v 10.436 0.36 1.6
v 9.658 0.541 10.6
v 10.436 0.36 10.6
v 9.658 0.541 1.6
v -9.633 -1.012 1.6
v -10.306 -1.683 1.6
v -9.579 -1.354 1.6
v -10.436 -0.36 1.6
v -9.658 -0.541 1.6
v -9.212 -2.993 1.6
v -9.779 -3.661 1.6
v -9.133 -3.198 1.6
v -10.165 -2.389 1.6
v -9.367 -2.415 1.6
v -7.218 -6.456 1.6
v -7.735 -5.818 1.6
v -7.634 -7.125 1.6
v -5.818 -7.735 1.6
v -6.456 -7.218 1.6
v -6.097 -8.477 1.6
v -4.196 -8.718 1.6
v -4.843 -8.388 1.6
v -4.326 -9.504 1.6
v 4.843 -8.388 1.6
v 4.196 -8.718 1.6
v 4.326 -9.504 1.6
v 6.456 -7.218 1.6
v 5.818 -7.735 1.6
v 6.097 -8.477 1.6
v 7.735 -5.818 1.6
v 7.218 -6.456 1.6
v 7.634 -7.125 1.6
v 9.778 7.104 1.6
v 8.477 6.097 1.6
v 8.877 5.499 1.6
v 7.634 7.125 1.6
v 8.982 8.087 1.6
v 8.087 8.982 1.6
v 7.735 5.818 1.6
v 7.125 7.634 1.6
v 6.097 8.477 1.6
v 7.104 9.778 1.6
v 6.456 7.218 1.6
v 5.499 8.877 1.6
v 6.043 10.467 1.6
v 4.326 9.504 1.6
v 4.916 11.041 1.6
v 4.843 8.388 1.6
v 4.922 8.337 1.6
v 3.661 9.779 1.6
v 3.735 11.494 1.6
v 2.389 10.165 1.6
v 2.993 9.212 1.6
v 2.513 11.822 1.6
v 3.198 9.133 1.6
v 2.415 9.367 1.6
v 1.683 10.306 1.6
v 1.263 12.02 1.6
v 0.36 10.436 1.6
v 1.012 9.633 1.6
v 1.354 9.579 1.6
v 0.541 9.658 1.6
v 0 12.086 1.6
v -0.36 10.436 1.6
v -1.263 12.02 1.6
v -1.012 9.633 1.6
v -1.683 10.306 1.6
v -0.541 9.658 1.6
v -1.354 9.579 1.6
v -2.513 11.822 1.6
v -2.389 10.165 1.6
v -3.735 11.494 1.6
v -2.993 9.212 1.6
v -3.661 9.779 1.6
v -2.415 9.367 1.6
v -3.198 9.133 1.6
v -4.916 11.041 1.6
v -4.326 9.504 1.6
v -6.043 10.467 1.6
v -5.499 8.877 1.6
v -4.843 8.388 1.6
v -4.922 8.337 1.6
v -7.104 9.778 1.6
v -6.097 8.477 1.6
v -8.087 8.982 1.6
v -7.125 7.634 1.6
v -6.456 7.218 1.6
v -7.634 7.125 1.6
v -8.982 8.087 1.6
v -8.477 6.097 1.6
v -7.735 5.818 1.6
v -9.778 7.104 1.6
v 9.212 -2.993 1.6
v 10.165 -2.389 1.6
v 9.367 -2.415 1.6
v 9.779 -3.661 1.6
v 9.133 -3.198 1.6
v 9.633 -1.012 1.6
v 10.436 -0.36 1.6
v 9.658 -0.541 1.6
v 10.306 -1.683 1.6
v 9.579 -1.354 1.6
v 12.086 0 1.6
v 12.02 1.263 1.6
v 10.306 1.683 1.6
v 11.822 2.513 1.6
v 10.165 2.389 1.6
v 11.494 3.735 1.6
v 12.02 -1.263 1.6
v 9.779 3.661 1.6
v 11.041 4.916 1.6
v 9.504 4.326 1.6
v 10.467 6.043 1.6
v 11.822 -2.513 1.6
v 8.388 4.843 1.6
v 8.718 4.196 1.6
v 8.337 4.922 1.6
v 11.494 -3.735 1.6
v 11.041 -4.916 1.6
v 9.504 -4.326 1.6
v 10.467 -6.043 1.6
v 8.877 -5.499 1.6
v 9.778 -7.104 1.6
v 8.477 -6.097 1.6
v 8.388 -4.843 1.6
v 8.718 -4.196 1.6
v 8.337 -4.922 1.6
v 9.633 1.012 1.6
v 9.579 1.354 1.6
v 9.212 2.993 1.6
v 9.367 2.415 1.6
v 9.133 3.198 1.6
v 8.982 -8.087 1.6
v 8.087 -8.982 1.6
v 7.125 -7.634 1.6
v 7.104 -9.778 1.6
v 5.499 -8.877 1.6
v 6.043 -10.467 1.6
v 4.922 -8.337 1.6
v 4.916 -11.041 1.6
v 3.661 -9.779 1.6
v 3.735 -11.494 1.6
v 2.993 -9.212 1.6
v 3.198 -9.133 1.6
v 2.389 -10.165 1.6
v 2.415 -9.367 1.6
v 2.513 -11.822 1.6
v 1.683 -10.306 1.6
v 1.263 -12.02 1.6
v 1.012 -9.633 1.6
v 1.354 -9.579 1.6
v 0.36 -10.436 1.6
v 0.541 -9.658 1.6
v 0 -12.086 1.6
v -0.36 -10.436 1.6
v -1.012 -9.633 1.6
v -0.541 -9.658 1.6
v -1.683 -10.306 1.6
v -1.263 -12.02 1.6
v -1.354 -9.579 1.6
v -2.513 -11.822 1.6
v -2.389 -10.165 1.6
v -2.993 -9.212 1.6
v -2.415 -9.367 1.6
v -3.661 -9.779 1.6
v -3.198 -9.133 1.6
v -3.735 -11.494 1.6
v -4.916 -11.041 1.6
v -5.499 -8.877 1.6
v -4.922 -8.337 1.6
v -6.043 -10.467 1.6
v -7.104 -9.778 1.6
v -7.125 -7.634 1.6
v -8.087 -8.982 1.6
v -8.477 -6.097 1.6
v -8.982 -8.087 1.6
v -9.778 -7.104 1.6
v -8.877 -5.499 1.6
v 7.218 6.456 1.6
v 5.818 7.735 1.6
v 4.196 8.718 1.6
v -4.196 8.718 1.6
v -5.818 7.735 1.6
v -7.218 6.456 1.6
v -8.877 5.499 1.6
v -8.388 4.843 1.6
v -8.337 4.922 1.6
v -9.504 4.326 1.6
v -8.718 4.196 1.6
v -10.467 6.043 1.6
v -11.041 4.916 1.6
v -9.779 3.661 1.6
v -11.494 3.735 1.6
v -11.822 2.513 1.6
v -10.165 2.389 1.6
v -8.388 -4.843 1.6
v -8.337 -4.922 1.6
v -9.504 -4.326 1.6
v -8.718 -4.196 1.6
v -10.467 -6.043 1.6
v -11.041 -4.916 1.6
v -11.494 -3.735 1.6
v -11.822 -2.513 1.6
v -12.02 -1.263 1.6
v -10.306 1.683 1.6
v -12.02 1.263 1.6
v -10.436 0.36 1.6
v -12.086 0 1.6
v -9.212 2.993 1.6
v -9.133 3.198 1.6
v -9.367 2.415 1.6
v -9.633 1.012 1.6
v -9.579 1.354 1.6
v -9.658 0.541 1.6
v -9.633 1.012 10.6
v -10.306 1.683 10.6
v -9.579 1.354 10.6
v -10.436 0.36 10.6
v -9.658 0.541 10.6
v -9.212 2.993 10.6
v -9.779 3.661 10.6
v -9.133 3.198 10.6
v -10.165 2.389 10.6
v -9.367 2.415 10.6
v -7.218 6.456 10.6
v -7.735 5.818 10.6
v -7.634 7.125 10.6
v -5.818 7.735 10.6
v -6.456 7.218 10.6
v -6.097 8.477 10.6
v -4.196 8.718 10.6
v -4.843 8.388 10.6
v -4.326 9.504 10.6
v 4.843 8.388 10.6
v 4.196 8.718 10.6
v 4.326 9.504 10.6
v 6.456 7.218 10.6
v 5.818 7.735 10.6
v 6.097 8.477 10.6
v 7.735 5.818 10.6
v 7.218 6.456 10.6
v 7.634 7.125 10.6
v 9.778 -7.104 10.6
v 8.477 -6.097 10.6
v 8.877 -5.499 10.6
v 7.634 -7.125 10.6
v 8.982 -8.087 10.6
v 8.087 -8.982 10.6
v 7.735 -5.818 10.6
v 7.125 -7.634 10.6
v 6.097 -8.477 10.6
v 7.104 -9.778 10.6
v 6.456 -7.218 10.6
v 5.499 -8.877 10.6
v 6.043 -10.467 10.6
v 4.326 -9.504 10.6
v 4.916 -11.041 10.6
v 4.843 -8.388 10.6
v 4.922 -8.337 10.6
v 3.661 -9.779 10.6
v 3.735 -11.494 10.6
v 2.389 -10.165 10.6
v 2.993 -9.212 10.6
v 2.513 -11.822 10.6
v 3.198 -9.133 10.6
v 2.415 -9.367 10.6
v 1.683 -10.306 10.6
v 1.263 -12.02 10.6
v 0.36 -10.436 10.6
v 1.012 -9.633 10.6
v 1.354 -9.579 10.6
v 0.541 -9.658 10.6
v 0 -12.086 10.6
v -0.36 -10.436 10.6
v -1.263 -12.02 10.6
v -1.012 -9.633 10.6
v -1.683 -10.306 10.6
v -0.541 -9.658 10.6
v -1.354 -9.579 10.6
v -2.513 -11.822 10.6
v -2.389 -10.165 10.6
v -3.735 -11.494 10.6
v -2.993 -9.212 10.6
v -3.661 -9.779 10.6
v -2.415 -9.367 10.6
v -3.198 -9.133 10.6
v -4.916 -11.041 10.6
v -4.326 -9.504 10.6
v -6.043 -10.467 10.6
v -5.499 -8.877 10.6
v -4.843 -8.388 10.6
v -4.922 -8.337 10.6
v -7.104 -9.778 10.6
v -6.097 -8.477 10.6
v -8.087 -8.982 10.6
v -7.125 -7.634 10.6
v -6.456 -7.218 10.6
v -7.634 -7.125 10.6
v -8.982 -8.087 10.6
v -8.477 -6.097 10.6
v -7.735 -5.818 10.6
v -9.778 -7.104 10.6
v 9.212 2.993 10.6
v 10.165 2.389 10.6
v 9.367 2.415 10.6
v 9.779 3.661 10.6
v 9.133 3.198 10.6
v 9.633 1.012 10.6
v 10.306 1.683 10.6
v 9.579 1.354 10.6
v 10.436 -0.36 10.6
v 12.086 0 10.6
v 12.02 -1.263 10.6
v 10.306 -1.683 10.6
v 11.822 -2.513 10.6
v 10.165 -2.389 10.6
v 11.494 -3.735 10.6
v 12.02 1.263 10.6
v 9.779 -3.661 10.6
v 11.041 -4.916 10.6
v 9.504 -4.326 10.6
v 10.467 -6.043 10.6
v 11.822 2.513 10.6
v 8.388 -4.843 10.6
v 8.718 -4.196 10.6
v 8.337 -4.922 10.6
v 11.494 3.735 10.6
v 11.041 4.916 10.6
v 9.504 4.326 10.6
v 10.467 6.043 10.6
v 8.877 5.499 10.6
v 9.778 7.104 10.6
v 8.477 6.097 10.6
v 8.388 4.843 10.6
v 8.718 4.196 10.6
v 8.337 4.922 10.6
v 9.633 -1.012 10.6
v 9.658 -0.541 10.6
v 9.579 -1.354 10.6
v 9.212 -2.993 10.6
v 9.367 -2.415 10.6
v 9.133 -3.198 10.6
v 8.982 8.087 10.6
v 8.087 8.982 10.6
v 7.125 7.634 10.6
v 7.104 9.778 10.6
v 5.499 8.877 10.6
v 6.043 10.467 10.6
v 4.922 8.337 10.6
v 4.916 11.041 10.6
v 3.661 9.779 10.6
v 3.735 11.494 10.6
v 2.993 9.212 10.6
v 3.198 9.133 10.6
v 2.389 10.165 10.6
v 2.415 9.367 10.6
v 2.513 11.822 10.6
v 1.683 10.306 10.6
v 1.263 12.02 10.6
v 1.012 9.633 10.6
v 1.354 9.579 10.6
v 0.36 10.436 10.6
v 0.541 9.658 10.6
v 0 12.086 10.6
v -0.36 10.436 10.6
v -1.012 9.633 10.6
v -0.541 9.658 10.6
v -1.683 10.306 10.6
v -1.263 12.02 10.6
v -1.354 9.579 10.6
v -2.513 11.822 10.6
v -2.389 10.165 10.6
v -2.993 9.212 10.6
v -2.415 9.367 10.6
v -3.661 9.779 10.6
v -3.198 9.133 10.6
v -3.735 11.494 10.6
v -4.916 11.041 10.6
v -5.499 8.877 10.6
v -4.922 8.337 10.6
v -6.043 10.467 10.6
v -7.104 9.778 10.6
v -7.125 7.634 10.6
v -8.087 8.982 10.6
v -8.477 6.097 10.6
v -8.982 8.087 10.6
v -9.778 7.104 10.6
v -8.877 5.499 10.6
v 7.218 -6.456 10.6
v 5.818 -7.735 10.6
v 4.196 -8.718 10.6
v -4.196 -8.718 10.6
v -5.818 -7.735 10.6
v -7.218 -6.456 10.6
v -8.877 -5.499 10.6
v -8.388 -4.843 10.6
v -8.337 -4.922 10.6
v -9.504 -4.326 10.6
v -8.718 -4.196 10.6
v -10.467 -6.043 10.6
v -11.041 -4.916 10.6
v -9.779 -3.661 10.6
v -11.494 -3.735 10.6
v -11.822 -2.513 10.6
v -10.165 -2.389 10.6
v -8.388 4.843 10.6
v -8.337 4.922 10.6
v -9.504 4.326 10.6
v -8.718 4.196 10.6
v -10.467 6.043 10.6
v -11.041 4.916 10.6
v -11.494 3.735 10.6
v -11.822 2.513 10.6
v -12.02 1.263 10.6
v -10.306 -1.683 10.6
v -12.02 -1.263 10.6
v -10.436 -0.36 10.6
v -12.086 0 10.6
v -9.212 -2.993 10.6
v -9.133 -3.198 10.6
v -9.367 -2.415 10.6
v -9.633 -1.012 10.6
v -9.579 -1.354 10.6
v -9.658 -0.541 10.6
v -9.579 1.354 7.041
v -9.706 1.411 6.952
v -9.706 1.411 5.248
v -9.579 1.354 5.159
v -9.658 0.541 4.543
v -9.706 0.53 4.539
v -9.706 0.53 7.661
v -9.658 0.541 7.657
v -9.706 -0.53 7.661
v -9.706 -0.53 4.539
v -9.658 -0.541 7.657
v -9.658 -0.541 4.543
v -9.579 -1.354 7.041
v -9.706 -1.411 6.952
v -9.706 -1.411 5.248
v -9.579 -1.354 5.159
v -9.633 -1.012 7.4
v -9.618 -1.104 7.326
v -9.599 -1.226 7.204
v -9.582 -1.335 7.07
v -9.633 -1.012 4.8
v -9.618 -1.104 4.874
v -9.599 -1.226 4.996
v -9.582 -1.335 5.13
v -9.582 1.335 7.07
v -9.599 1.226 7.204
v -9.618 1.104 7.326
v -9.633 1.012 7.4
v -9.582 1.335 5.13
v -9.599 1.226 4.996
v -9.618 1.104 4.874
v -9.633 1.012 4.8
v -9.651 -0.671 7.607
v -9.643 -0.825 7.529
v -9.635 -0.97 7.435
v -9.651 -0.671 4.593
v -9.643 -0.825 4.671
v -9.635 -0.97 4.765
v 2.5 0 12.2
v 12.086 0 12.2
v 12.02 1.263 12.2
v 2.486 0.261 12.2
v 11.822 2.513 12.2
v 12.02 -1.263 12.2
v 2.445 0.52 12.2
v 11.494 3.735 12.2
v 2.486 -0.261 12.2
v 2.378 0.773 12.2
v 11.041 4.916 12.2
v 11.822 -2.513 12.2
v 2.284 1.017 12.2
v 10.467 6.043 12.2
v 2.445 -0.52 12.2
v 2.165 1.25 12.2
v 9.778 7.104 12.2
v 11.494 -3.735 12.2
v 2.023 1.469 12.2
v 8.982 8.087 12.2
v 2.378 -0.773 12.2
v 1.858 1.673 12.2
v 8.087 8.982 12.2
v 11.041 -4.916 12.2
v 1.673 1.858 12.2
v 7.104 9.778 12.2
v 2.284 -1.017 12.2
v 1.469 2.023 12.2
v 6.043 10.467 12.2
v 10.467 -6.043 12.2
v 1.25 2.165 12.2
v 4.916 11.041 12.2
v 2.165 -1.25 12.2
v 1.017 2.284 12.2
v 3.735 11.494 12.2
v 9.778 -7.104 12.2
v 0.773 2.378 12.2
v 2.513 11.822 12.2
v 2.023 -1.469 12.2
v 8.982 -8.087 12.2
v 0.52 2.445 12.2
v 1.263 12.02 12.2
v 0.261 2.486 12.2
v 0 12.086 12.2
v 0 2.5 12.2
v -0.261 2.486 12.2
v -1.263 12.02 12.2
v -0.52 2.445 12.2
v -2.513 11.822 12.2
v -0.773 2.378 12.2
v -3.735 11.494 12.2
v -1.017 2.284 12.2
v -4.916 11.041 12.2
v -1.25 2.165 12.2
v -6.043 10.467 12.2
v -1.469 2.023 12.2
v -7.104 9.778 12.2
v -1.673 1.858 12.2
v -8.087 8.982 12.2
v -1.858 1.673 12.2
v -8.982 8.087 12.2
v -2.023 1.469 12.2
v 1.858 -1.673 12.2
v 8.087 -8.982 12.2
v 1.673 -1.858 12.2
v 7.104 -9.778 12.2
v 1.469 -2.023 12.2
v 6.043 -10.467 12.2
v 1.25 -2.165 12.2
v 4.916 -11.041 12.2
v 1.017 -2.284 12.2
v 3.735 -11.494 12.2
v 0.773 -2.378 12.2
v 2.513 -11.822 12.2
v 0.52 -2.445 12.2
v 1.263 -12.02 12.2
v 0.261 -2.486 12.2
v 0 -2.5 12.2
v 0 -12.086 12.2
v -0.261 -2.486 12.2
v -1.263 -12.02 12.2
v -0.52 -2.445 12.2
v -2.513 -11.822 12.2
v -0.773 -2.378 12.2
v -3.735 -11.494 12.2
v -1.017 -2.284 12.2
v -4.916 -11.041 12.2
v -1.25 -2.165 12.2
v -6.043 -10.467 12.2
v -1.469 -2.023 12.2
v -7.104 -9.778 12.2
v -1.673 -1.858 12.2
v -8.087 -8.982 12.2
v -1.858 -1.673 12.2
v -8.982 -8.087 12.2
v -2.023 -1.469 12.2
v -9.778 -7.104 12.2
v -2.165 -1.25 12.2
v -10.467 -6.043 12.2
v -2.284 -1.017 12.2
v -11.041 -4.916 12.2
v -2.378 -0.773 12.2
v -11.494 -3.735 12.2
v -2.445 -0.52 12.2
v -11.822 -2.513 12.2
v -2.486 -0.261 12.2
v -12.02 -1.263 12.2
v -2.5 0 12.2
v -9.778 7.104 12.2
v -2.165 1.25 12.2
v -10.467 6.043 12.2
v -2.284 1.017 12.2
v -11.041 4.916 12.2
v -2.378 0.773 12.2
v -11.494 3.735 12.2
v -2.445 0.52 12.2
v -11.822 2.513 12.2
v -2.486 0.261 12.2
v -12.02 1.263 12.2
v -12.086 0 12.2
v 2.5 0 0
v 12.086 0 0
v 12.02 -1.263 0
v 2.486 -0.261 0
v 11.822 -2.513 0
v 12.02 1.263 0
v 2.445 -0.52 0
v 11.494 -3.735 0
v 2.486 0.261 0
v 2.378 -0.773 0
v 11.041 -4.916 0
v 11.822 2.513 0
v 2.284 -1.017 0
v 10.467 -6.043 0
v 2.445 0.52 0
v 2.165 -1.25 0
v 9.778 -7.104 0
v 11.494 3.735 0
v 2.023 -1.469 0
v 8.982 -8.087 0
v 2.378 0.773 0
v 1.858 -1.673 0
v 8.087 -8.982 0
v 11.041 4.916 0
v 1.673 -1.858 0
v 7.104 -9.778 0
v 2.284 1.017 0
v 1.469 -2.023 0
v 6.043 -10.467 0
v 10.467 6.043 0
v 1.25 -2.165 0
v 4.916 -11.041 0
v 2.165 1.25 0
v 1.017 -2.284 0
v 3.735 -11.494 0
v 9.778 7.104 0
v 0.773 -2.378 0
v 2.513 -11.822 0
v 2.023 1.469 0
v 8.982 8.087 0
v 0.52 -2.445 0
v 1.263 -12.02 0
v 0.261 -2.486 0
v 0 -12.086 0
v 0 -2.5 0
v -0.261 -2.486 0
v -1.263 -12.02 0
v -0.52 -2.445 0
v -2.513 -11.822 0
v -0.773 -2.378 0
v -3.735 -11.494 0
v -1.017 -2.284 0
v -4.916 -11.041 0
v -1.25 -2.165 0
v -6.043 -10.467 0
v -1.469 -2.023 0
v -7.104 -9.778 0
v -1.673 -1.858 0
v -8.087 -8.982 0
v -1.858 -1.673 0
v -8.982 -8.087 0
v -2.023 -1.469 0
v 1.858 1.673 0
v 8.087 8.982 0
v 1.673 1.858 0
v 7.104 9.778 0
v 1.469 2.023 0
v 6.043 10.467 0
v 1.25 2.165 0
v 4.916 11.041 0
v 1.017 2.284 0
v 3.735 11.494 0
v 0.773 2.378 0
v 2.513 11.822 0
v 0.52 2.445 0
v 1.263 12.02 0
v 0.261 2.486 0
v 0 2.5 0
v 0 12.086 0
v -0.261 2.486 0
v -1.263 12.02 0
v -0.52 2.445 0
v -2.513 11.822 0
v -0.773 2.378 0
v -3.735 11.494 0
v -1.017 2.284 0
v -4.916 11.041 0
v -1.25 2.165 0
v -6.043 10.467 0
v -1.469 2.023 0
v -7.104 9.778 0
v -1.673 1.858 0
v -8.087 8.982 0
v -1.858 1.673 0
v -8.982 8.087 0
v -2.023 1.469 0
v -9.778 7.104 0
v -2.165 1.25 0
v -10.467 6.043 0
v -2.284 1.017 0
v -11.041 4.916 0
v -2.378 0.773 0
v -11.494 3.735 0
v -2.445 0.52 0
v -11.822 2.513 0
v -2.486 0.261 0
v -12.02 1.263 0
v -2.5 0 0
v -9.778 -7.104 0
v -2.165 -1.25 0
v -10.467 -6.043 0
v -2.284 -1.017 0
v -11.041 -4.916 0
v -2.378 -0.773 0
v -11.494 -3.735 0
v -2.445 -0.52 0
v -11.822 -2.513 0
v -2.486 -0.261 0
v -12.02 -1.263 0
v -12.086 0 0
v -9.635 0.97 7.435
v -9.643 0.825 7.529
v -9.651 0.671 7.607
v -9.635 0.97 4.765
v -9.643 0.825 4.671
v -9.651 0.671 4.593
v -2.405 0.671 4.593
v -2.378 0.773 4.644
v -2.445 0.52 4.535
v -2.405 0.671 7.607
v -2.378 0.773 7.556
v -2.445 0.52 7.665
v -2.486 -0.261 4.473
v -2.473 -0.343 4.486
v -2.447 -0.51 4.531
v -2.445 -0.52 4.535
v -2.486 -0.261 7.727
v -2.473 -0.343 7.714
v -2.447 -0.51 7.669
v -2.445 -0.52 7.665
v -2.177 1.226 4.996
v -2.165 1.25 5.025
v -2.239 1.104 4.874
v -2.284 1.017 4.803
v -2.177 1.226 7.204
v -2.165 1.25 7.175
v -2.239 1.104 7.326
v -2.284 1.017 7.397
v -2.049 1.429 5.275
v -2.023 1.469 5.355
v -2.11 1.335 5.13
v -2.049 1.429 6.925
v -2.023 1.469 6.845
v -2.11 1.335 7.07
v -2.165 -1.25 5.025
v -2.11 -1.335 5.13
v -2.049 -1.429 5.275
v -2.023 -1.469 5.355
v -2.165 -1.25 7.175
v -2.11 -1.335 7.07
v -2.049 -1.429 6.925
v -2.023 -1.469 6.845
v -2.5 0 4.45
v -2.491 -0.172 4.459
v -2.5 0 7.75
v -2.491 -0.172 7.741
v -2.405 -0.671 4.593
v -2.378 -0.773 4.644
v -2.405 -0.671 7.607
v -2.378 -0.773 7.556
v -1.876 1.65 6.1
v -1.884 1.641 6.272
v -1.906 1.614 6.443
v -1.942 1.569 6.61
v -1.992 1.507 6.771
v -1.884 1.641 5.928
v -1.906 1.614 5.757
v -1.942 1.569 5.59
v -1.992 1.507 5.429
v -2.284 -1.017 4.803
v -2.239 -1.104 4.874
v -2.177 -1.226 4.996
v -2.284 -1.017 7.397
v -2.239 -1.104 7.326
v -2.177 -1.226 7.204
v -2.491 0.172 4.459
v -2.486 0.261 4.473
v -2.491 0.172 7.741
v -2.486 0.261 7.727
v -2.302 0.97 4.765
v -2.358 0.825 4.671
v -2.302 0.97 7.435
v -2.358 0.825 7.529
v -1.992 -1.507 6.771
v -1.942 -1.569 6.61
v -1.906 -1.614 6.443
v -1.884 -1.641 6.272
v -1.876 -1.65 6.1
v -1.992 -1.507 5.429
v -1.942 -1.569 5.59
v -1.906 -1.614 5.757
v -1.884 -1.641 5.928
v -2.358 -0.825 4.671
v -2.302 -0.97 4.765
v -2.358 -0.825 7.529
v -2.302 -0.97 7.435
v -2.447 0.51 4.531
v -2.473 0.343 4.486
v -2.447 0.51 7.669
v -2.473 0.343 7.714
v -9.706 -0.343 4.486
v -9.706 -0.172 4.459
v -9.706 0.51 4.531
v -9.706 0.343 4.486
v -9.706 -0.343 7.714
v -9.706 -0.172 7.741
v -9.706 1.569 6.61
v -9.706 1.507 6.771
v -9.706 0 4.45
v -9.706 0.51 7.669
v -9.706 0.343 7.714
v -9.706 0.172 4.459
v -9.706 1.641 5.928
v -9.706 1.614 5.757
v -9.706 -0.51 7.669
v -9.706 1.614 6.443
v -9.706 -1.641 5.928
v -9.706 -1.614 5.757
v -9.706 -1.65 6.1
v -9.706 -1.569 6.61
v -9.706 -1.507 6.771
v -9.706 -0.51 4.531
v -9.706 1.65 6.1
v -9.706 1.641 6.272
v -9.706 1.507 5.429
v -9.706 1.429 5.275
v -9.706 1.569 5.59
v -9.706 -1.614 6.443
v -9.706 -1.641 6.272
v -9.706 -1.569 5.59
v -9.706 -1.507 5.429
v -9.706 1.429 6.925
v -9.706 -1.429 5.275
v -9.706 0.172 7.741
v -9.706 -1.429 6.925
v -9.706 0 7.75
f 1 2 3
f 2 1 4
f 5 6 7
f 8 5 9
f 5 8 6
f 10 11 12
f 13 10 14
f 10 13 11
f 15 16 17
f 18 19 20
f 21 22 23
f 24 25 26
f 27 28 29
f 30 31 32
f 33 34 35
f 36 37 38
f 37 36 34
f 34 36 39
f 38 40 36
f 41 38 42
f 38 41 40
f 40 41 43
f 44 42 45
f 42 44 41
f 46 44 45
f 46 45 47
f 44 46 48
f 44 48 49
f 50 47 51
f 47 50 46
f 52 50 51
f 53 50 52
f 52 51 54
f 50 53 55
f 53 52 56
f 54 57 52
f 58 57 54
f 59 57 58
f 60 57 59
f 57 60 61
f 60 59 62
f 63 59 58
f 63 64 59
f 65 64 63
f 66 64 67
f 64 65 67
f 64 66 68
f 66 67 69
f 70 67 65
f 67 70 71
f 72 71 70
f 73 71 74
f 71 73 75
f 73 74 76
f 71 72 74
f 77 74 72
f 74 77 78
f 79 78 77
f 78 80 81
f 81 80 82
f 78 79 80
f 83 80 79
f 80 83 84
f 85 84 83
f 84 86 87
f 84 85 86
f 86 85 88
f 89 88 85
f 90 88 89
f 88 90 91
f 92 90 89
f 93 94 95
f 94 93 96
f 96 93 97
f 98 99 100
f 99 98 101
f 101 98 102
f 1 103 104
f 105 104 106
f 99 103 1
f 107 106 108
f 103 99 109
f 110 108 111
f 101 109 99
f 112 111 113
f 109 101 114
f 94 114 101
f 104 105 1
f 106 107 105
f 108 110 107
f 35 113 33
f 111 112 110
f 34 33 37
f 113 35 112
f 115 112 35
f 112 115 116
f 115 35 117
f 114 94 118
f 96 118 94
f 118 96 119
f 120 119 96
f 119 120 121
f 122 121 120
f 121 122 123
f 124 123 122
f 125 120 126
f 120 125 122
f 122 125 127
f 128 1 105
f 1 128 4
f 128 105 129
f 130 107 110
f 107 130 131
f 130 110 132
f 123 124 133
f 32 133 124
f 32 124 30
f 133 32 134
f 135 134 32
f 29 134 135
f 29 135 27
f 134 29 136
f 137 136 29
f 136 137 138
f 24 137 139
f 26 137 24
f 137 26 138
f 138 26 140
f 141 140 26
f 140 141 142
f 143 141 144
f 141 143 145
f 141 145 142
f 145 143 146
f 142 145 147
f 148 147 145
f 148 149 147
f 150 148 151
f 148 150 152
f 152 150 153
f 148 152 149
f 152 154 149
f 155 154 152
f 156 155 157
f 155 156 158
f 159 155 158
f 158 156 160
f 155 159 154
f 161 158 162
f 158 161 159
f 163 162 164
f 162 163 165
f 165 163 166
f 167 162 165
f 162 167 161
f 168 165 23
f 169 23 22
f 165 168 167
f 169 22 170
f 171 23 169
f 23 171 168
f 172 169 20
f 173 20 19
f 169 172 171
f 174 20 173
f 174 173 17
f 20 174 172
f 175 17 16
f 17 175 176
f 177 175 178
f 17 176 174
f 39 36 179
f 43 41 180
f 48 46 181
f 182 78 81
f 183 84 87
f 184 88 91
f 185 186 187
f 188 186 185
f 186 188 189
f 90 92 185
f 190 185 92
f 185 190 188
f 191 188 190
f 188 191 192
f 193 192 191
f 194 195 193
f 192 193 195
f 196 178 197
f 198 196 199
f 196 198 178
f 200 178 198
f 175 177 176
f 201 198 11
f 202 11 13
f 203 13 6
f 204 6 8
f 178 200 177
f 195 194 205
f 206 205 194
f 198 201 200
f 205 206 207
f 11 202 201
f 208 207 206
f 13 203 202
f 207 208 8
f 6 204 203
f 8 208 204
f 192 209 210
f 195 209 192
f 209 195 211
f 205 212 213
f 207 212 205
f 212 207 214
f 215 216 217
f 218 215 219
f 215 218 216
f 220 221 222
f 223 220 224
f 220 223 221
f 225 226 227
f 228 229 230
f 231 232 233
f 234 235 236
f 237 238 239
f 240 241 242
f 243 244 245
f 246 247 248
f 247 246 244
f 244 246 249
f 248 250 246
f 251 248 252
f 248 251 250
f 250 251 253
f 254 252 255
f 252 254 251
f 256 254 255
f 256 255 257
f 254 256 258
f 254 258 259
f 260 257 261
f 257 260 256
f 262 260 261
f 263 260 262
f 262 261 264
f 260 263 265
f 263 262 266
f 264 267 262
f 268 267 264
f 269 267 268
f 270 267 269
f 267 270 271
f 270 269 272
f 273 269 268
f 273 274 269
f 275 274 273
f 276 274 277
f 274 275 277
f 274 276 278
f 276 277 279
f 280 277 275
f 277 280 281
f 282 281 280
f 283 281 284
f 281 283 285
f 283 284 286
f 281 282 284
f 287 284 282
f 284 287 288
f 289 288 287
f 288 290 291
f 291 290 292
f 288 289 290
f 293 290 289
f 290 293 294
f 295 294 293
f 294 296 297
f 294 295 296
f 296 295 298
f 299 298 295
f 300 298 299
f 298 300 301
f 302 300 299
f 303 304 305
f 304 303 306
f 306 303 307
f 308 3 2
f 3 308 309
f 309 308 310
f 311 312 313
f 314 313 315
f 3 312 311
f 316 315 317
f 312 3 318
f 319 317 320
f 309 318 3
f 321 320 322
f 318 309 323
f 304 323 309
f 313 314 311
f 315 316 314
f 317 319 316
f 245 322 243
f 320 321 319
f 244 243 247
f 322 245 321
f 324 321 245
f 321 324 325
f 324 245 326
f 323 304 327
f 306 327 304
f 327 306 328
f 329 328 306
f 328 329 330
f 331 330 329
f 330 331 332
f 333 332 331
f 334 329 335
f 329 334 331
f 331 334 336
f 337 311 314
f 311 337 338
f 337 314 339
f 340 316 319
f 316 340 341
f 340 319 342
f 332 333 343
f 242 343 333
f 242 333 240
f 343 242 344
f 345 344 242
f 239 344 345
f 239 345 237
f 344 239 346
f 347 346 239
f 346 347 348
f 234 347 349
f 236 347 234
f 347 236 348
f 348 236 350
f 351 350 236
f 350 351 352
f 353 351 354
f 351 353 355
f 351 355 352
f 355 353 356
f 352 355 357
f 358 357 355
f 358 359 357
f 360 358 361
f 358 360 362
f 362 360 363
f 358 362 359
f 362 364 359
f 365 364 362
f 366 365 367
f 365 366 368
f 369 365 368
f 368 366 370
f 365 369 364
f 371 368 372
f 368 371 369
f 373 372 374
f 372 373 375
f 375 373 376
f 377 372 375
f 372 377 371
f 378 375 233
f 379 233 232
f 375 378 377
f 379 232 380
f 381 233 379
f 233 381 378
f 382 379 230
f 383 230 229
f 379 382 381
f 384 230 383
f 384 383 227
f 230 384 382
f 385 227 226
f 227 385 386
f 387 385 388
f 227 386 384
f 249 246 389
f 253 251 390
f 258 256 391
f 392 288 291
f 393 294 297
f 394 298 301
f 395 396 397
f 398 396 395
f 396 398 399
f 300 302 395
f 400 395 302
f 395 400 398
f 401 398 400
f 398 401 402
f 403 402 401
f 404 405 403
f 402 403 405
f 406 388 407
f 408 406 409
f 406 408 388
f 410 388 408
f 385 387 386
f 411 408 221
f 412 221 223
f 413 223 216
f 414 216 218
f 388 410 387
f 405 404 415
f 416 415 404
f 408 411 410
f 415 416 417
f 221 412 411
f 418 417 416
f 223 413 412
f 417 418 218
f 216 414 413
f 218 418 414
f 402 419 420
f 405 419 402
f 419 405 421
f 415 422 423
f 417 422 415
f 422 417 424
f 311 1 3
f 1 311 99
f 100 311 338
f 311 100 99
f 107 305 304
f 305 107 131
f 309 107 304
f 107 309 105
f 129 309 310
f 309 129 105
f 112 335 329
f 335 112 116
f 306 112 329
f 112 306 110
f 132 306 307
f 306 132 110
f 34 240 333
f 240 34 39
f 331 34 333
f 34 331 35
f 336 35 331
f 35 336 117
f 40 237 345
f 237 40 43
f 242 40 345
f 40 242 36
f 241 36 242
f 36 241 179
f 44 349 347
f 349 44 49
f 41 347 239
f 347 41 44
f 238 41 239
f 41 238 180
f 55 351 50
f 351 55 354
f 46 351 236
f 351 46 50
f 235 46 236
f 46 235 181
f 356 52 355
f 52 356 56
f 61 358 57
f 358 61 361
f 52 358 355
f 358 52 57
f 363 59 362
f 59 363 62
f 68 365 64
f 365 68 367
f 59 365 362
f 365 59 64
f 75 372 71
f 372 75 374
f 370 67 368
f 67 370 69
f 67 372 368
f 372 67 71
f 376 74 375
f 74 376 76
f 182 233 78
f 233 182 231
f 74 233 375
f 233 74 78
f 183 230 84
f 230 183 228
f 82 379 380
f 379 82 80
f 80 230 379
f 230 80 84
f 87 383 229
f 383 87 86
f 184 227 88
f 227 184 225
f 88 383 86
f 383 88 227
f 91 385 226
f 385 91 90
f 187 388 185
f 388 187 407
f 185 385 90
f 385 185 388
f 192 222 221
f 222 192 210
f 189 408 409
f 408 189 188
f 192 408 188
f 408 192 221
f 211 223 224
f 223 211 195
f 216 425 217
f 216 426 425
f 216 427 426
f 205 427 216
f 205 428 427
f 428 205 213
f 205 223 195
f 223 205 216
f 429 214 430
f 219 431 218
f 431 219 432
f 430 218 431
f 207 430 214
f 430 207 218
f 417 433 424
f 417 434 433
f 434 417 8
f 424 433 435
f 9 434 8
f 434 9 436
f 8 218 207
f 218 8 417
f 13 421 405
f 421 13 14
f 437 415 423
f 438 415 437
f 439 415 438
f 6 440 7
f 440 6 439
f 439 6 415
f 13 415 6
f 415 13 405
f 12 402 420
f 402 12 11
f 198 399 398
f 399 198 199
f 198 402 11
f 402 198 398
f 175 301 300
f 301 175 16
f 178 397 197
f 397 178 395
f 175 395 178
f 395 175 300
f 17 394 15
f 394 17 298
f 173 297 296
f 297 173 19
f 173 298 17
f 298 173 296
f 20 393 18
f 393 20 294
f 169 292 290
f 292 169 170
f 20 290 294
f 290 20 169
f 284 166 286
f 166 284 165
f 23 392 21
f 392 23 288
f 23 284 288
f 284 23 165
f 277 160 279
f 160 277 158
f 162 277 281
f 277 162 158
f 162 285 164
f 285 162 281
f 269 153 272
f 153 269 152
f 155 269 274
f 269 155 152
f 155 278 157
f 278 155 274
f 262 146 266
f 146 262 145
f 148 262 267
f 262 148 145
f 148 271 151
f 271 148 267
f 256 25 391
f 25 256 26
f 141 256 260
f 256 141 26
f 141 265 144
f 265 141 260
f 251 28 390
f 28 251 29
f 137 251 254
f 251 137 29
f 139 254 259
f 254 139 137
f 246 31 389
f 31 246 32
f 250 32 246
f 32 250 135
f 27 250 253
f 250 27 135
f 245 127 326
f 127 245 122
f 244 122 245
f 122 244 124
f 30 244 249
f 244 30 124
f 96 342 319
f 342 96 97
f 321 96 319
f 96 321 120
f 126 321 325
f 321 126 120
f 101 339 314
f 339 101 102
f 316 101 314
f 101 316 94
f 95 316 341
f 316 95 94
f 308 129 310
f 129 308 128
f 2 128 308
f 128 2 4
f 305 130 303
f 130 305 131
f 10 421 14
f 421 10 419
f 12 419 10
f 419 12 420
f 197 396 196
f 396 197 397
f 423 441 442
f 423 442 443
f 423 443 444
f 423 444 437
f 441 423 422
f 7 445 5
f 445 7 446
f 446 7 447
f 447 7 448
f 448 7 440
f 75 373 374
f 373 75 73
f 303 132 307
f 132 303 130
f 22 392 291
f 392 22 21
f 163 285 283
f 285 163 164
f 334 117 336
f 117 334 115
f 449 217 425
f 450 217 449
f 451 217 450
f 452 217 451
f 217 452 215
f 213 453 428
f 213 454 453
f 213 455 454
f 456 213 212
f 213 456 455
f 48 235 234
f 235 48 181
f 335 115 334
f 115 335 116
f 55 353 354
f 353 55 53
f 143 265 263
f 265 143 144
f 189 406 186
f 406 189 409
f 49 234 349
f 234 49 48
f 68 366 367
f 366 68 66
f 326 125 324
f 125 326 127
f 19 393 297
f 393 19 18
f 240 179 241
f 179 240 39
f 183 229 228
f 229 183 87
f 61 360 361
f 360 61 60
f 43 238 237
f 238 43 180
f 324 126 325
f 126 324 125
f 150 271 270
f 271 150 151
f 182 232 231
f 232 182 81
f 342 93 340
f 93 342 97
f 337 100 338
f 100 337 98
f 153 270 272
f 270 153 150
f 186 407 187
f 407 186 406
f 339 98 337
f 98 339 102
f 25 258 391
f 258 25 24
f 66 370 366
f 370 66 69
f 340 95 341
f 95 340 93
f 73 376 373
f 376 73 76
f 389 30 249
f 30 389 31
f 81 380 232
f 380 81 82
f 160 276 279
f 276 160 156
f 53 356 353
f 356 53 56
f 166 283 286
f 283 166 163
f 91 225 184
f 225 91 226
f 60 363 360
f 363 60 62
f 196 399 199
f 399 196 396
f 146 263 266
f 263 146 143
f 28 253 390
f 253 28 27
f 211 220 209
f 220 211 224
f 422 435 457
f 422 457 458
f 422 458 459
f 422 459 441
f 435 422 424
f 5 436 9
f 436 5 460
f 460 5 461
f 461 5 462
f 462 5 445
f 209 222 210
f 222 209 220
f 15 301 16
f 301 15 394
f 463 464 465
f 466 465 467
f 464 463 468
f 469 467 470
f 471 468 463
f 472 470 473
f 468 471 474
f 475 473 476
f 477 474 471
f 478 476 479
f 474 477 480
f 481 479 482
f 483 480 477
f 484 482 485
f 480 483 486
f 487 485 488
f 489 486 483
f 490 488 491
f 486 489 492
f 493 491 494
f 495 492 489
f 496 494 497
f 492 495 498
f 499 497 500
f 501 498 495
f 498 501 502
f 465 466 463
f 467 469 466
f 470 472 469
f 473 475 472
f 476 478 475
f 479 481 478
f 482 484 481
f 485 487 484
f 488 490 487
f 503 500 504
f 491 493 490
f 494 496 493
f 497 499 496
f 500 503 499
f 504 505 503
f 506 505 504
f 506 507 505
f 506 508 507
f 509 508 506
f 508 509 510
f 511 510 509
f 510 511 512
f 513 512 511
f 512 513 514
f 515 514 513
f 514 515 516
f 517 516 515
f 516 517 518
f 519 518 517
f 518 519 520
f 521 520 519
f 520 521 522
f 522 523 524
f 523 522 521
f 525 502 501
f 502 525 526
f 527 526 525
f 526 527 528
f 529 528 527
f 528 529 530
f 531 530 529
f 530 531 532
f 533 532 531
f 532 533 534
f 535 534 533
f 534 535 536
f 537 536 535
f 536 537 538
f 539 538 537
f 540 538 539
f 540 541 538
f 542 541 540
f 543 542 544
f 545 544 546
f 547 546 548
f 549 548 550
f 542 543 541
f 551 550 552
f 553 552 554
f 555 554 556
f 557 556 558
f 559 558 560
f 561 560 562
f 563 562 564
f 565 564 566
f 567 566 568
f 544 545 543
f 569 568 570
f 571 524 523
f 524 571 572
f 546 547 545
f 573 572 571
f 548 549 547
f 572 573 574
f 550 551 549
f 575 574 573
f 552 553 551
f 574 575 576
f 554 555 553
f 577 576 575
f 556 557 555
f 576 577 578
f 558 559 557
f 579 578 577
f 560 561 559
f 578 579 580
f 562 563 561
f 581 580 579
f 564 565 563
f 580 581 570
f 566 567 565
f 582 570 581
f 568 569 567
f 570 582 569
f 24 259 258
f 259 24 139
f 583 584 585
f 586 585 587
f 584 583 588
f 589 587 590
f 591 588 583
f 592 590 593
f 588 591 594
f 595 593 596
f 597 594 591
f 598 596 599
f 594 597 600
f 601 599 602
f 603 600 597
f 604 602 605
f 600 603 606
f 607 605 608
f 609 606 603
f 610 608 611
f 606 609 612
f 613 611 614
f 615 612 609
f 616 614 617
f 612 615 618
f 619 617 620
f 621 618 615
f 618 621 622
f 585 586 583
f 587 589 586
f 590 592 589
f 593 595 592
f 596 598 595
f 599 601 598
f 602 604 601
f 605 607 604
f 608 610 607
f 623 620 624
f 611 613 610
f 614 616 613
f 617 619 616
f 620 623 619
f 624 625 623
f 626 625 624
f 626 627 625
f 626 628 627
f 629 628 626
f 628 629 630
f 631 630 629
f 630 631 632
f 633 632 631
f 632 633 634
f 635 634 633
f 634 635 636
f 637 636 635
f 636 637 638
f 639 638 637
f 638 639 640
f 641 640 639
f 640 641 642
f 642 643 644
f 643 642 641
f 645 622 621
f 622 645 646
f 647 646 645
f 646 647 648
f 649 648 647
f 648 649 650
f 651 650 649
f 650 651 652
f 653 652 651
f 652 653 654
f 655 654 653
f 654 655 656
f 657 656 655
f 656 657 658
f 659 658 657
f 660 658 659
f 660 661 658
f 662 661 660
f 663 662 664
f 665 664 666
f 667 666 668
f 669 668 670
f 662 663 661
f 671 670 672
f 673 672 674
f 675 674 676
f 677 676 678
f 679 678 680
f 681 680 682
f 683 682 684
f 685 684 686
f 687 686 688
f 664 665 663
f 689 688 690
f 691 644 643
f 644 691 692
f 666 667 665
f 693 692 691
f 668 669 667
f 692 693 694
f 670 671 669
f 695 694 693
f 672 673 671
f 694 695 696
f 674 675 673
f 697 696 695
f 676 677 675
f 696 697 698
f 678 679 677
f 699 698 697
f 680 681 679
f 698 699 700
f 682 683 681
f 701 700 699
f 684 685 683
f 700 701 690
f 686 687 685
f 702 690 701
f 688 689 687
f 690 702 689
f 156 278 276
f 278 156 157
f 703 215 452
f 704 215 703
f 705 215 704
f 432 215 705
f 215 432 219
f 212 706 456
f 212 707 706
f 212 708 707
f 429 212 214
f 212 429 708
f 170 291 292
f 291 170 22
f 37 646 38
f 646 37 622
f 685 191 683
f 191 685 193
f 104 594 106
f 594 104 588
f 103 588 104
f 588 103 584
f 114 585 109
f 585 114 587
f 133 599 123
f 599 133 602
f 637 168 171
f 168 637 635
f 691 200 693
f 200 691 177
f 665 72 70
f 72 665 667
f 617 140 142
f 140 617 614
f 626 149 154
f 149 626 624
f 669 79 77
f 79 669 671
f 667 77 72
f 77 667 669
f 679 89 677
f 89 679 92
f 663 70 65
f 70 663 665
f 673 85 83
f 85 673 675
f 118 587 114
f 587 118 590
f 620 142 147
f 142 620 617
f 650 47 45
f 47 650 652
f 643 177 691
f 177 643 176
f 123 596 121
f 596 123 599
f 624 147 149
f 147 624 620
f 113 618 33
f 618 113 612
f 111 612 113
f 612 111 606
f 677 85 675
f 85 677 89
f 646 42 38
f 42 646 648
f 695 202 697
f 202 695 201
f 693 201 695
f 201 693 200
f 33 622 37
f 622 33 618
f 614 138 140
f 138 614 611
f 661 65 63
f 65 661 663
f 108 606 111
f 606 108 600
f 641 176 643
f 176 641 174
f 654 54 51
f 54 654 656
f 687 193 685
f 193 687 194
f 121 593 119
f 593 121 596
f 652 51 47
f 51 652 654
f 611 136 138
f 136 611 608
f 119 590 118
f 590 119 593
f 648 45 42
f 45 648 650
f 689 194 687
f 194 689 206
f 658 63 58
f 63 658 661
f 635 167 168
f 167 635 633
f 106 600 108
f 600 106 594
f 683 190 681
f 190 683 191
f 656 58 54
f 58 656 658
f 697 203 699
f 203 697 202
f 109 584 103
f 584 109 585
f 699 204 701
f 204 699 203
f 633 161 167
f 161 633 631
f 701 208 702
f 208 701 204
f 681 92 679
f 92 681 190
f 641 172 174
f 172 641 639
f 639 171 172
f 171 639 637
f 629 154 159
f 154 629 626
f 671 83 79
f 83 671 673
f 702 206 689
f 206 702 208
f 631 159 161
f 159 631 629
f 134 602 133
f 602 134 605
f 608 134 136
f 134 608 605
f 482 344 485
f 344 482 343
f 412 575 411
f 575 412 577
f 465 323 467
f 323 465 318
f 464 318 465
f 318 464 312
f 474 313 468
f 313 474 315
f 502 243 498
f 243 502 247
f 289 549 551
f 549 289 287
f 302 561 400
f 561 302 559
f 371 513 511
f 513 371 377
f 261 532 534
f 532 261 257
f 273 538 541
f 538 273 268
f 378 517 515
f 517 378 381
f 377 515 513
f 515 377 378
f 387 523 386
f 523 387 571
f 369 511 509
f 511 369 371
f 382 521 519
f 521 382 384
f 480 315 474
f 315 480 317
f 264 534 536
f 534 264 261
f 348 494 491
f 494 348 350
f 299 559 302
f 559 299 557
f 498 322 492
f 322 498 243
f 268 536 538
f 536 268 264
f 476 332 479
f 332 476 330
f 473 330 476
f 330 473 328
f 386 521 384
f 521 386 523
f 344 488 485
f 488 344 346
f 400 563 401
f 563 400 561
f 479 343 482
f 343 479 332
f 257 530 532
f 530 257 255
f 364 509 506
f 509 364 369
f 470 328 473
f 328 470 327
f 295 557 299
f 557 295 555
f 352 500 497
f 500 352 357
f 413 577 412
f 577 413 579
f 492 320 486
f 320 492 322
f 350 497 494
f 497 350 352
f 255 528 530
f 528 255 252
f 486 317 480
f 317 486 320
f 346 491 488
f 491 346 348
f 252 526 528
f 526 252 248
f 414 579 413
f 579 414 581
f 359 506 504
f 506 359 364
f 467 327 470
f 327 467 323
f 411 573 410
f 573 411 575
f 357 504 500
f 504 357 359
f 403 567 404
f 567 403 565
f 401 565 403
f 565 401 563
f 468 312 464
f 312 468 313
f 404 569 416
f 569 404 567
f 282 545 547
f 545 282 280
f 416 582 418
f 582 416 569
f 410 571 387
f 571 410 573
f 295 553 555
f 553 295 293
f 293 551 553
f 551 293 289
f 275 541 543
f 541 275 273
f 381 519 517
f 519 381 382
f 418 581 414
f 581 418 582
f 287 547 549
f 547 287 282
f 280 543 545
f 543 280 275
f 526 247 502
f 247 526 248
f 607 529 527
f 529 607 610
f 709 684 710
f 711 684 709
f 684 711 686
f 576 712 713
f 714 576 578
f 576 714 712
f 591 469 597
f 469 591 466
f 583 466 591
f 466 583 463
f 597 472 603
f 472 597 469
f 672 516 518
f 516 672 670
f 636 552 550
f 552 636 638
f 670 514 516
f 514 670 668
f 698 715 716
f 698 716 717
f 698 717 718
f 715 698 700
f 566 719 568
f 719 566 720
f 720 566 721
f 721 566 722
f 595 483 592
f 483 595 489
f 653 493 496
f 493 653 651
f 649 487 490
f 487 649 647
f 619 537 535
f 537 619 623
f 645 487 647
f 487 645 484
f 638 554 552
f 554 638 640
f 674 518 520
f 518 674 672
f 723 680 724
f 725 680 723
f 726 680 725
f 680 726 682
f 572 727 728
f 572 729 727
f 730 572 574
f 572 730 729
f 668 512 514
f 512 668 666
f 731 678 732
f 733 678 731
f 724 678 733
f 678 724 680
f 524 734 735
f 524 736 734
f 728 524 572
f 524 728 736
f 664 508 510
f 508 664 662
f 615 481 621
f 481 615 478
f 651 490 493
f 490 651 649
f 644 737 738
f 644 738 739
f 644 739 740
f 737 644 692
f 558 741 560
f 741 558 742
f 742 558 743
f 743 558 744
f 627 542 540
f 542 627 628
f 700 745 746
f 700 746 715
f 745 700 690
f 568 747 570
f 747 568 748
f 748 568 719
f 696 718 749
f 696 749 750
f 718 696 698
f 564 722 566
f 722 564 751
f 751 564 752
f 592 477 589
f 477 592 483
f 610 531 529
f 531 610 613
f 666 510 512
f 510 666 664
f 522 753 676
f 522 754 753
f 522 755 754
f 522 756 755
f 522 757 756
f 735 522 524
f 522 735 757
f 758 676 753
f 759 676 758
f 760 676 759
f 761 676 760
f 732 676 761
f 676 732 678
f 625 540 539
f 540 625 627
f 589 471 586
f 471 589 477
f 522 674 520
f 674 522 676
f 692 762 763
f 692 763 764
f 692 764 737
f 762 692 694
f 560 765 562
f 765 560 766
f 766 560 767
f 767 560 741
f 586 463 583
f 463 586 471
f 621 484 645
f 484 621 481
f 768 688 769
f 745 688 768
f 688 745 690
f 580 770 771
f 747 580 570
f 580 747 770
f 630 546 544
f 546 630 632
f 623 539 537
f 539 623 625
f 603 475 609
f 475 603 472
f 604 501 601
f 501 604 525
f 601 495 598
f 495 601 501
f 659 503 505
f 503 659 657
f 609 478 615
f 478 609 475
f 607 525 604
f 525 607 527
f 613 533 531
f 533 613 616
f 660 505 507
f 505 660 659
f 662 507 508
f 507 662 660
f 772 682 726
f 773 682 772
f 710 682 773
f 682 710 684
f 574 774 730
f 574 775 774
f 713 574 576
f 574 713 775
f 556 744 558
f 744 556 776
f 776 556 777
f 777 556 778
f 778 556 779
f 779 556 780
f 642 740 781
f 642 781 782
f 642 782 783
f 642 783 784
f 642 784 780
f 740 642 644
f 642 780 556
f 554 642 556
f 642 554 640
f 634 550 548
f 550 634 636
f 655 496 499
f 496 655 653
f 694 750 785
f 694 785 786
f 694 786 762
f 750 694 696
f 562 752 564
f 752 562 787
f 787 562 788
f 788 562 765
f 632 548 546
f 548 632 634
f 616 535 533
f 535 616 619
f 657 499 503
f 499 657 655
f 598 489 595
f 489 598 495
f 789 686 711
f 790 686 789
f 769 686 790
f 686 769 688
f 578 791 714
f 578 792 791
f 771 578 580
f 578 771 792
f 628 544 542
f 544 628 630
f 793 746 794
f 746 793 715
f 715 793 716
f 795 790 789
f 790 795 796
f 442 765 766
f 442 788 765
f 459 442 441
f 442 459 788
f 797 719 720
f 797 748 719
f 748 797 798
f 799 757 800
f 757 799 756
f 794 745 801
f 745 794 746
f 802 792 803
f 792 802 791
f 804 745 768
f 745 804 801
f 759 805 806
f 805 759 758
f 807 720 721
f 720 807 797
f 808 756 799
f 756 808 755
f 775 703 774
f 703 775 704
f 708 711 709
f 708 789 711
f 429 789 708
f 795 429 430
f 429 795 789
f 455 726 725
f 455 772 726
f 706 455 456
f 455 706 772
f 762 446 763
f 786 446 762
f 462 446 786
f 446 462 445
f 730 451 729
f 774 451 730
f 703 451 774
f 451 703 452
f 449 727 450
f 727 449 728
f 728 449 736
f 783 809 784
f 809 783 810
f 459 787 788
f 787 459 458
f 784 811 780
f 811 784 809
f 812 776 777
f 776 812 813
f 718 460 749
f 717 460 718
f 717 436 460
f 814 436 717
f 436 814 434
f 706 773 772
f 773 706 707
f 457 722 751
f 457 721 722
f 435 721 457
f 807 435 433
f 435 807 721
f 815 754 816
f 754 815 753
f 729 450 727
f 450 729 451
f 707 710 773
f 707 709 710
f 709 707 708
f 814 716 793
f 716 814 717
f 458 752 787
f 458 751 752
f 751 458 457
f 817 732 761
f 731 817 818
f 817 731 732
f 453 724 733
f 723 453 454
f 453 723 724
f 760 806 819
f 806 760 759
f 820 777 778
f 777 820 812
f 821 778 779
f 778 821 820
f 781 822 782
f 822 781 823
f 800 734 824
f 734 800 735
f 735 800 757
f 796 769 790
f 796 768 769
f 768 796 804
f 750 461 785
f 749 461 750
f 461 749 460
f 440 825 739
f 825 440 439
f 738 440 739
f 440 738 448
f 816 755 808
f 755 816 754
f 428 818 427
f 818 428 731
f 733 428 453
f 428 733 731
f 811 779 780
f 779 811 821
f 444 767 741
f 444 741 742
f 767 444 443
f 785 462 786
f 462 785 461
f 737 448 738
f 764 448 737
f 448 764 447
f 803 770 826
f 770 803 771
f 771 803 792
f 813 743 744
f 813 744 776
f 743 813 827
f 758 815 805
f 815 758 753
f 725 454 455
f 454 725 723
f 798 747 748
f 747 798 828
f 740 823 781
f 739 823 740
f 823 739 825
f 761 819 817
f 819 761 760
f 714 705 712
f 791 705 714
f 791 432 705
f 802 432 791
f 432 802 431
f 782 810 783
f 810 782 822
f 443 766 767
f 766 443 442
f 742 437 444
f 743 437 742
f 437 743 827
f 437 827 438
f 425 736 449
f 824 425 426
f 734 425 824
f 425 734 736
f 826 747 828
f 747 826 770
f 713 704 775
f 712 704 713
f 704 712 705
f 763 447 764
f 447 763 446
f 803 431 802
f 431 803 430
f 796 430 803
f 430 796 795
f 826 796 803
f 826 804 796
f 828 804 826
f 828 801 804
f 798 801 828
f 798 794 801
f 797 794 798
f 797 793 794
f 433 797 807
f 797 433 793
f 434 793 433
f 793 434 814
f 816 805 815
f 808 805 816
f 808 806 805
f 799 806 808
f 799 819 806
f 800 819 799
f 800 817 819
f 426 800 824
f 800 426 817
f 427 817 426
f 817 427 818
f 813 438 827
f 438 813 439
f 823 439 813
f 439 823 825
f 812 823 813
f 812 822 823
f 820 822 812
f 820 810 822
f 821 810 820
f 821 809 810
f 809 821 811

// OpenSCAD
// GT2 pulley, 32 teeth for 9 mm belt.
$fn = 60;
eps = 0.02;
teeth = 32;
belt_pitch = 2;
belt_w = 9;
shaft_d = 5;
set_screw_d = 3.3;
tooth_depth = 0.75;
tooth_overlap = 0.28;
tooth_base_w = 1.2;
tooth_tip_w = 0.72;
flange_t = 1.6;
core_d = teeth * belt_pitch / PI - 1.0;
body_h = belt_w + 2 * flange_t;
module tooth() {
    linear_extrude(height = belt_w)
        polygon(points = [[-tooth_overlap, -tooth_base_w / 2], [tooth_depth, -tooth_tip_w / 2], [tooth_depth, tooth_tip_w / 2], [-tooth_overlap, tooth_base_w / 2]]);
}
difference() {
    union() {
        cylinder(d = core_d, h = body_h);
        cylinder(d = core_d + 4.8, h = flange_t);
        translate([0, 0, body_h - flange_t]) cylinder(d = core_d + 4.8, h = flange_t);
        for (i = [0 : teeth - 1]) rotate([0, 0, i * 360 / teeth]) translate([core_d / 2, 0, flange_t]) tooth();
    }
    translate([0, 0, -eps]) cylinder(d = shaft_d, h = body_h + 2 * eps);
    translate([-core_d / 2 - eps, 0, body_h / 2]) rotate([0, 90, 0]) cylinder(d = set_screw_d, h = core_d / 2 + 2 * eps);
}
